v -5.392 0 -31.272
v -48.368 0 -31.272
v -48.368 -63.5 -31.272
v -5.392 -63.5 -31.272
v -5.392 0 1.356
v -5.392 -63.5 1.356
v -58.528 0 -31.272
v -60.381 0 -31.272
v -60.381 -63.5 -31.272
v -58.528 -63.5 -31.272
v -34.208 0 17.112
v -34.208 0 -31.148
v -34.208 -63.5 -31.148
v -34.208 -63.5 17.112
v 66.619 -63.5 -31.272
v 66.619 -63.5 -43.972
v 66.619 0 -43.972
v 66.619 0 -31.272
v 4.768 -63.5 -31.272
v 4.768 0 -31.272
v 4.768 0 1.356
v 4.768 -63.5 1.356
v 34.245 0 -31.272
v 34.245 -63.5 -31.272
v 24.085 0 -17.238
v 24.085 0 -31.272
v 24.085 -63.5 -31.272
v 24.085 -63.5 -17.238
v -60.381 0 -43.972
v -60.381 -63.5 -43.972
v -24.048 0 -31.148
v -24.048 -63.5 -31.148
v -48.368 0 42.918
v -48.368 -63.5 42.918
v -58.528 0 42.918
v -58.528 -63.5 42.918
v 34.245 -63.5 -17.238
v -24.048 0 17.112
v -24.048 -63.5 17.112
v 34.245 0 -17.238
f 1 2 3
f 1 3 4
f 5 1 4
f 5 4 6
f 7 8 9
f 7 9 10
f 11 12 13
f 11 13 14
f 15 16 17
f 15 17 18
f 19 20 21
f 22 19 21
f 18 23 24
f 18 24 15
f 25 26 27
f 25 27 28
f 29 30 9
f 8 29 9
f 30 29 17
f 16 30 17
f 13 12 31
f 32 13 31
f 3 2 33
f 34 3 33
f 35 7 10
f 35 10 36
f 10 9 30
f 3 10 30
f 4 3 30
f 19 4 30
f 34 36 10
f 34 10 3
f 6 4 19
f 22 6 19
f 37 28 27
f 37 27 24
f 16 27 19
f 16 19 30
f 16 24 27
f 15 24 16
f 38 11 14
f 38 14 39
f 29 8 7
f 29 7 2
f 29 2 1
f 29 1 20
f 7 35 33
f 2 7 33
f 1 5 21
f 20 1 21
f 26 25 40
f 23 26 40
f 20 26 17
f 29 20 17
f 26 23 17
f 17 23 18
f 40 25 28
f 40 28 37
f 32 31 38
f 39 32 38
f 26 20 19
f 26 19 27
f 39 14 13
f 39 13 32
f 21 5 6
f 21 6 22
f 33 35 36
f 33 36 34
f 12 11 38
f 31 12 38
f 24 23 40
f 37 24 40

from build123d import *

# Parameters (mm, degrees)
F0_W     = 127
F0_H     = 12.7
F2_DEPTH = 63.5
F1_W     = 10.16
F1_H     = 76.204258
F3_DEPTH = 63.5
F4_W     = 10.16
F4_H     = 48.26
F7_DEPTH = 63.5
F5_W     = 10.16
F5_H     = 33.02
F8_DEPTH = 63.5
F6_W     = 10.16
F6_H     = 15.24
F9_DEPTH = 63.5


with BuildPart() as f2:
    # F0 (on Front) → F2 (new body)
    with BuildSketch(Plane.XZ):
        with Locations((3.119301, -37.621977)):
            Rectangle(F0_W, F0_H)
    extrude(amount=F2_DEPTH)

    # F1 (on Front) → F3 (join)
    with BuildSketch(Plane.XZ):
        with Locations((-53.4477, 4.816202)):
            Rectangle(F1_W, F1_H)
    extrude(amount=F3_DEPTH)

    # F5 (on Front) → F8 (join)
    with BuildSketch(Plane.XZ):
        with Locations((-0.311929, -15.153663)):
            Rectangle(F5_W, F5_H)
    extrude(amount=F8_DEPTH)

    # F6 (on Front) → F9 (join)
    with BuildSketch(Plane.XZ):
        with Locations((29.165437, -24.857583)):
            Rectangle(F6_W, F6_H)
    extrude(amount=F9_DEPTH)


with BuildPart() as f7:
    # F4 (on Front) → F7 (new body)
    with BuildSketch(Plane.XZ):
        with Locations((-29.128493, -7.018421)):
            Rectangle(F4_W, F4_H)
    extrude(amount=F7_DEPTH)


solid = Compound([f2.part, f7.part])
